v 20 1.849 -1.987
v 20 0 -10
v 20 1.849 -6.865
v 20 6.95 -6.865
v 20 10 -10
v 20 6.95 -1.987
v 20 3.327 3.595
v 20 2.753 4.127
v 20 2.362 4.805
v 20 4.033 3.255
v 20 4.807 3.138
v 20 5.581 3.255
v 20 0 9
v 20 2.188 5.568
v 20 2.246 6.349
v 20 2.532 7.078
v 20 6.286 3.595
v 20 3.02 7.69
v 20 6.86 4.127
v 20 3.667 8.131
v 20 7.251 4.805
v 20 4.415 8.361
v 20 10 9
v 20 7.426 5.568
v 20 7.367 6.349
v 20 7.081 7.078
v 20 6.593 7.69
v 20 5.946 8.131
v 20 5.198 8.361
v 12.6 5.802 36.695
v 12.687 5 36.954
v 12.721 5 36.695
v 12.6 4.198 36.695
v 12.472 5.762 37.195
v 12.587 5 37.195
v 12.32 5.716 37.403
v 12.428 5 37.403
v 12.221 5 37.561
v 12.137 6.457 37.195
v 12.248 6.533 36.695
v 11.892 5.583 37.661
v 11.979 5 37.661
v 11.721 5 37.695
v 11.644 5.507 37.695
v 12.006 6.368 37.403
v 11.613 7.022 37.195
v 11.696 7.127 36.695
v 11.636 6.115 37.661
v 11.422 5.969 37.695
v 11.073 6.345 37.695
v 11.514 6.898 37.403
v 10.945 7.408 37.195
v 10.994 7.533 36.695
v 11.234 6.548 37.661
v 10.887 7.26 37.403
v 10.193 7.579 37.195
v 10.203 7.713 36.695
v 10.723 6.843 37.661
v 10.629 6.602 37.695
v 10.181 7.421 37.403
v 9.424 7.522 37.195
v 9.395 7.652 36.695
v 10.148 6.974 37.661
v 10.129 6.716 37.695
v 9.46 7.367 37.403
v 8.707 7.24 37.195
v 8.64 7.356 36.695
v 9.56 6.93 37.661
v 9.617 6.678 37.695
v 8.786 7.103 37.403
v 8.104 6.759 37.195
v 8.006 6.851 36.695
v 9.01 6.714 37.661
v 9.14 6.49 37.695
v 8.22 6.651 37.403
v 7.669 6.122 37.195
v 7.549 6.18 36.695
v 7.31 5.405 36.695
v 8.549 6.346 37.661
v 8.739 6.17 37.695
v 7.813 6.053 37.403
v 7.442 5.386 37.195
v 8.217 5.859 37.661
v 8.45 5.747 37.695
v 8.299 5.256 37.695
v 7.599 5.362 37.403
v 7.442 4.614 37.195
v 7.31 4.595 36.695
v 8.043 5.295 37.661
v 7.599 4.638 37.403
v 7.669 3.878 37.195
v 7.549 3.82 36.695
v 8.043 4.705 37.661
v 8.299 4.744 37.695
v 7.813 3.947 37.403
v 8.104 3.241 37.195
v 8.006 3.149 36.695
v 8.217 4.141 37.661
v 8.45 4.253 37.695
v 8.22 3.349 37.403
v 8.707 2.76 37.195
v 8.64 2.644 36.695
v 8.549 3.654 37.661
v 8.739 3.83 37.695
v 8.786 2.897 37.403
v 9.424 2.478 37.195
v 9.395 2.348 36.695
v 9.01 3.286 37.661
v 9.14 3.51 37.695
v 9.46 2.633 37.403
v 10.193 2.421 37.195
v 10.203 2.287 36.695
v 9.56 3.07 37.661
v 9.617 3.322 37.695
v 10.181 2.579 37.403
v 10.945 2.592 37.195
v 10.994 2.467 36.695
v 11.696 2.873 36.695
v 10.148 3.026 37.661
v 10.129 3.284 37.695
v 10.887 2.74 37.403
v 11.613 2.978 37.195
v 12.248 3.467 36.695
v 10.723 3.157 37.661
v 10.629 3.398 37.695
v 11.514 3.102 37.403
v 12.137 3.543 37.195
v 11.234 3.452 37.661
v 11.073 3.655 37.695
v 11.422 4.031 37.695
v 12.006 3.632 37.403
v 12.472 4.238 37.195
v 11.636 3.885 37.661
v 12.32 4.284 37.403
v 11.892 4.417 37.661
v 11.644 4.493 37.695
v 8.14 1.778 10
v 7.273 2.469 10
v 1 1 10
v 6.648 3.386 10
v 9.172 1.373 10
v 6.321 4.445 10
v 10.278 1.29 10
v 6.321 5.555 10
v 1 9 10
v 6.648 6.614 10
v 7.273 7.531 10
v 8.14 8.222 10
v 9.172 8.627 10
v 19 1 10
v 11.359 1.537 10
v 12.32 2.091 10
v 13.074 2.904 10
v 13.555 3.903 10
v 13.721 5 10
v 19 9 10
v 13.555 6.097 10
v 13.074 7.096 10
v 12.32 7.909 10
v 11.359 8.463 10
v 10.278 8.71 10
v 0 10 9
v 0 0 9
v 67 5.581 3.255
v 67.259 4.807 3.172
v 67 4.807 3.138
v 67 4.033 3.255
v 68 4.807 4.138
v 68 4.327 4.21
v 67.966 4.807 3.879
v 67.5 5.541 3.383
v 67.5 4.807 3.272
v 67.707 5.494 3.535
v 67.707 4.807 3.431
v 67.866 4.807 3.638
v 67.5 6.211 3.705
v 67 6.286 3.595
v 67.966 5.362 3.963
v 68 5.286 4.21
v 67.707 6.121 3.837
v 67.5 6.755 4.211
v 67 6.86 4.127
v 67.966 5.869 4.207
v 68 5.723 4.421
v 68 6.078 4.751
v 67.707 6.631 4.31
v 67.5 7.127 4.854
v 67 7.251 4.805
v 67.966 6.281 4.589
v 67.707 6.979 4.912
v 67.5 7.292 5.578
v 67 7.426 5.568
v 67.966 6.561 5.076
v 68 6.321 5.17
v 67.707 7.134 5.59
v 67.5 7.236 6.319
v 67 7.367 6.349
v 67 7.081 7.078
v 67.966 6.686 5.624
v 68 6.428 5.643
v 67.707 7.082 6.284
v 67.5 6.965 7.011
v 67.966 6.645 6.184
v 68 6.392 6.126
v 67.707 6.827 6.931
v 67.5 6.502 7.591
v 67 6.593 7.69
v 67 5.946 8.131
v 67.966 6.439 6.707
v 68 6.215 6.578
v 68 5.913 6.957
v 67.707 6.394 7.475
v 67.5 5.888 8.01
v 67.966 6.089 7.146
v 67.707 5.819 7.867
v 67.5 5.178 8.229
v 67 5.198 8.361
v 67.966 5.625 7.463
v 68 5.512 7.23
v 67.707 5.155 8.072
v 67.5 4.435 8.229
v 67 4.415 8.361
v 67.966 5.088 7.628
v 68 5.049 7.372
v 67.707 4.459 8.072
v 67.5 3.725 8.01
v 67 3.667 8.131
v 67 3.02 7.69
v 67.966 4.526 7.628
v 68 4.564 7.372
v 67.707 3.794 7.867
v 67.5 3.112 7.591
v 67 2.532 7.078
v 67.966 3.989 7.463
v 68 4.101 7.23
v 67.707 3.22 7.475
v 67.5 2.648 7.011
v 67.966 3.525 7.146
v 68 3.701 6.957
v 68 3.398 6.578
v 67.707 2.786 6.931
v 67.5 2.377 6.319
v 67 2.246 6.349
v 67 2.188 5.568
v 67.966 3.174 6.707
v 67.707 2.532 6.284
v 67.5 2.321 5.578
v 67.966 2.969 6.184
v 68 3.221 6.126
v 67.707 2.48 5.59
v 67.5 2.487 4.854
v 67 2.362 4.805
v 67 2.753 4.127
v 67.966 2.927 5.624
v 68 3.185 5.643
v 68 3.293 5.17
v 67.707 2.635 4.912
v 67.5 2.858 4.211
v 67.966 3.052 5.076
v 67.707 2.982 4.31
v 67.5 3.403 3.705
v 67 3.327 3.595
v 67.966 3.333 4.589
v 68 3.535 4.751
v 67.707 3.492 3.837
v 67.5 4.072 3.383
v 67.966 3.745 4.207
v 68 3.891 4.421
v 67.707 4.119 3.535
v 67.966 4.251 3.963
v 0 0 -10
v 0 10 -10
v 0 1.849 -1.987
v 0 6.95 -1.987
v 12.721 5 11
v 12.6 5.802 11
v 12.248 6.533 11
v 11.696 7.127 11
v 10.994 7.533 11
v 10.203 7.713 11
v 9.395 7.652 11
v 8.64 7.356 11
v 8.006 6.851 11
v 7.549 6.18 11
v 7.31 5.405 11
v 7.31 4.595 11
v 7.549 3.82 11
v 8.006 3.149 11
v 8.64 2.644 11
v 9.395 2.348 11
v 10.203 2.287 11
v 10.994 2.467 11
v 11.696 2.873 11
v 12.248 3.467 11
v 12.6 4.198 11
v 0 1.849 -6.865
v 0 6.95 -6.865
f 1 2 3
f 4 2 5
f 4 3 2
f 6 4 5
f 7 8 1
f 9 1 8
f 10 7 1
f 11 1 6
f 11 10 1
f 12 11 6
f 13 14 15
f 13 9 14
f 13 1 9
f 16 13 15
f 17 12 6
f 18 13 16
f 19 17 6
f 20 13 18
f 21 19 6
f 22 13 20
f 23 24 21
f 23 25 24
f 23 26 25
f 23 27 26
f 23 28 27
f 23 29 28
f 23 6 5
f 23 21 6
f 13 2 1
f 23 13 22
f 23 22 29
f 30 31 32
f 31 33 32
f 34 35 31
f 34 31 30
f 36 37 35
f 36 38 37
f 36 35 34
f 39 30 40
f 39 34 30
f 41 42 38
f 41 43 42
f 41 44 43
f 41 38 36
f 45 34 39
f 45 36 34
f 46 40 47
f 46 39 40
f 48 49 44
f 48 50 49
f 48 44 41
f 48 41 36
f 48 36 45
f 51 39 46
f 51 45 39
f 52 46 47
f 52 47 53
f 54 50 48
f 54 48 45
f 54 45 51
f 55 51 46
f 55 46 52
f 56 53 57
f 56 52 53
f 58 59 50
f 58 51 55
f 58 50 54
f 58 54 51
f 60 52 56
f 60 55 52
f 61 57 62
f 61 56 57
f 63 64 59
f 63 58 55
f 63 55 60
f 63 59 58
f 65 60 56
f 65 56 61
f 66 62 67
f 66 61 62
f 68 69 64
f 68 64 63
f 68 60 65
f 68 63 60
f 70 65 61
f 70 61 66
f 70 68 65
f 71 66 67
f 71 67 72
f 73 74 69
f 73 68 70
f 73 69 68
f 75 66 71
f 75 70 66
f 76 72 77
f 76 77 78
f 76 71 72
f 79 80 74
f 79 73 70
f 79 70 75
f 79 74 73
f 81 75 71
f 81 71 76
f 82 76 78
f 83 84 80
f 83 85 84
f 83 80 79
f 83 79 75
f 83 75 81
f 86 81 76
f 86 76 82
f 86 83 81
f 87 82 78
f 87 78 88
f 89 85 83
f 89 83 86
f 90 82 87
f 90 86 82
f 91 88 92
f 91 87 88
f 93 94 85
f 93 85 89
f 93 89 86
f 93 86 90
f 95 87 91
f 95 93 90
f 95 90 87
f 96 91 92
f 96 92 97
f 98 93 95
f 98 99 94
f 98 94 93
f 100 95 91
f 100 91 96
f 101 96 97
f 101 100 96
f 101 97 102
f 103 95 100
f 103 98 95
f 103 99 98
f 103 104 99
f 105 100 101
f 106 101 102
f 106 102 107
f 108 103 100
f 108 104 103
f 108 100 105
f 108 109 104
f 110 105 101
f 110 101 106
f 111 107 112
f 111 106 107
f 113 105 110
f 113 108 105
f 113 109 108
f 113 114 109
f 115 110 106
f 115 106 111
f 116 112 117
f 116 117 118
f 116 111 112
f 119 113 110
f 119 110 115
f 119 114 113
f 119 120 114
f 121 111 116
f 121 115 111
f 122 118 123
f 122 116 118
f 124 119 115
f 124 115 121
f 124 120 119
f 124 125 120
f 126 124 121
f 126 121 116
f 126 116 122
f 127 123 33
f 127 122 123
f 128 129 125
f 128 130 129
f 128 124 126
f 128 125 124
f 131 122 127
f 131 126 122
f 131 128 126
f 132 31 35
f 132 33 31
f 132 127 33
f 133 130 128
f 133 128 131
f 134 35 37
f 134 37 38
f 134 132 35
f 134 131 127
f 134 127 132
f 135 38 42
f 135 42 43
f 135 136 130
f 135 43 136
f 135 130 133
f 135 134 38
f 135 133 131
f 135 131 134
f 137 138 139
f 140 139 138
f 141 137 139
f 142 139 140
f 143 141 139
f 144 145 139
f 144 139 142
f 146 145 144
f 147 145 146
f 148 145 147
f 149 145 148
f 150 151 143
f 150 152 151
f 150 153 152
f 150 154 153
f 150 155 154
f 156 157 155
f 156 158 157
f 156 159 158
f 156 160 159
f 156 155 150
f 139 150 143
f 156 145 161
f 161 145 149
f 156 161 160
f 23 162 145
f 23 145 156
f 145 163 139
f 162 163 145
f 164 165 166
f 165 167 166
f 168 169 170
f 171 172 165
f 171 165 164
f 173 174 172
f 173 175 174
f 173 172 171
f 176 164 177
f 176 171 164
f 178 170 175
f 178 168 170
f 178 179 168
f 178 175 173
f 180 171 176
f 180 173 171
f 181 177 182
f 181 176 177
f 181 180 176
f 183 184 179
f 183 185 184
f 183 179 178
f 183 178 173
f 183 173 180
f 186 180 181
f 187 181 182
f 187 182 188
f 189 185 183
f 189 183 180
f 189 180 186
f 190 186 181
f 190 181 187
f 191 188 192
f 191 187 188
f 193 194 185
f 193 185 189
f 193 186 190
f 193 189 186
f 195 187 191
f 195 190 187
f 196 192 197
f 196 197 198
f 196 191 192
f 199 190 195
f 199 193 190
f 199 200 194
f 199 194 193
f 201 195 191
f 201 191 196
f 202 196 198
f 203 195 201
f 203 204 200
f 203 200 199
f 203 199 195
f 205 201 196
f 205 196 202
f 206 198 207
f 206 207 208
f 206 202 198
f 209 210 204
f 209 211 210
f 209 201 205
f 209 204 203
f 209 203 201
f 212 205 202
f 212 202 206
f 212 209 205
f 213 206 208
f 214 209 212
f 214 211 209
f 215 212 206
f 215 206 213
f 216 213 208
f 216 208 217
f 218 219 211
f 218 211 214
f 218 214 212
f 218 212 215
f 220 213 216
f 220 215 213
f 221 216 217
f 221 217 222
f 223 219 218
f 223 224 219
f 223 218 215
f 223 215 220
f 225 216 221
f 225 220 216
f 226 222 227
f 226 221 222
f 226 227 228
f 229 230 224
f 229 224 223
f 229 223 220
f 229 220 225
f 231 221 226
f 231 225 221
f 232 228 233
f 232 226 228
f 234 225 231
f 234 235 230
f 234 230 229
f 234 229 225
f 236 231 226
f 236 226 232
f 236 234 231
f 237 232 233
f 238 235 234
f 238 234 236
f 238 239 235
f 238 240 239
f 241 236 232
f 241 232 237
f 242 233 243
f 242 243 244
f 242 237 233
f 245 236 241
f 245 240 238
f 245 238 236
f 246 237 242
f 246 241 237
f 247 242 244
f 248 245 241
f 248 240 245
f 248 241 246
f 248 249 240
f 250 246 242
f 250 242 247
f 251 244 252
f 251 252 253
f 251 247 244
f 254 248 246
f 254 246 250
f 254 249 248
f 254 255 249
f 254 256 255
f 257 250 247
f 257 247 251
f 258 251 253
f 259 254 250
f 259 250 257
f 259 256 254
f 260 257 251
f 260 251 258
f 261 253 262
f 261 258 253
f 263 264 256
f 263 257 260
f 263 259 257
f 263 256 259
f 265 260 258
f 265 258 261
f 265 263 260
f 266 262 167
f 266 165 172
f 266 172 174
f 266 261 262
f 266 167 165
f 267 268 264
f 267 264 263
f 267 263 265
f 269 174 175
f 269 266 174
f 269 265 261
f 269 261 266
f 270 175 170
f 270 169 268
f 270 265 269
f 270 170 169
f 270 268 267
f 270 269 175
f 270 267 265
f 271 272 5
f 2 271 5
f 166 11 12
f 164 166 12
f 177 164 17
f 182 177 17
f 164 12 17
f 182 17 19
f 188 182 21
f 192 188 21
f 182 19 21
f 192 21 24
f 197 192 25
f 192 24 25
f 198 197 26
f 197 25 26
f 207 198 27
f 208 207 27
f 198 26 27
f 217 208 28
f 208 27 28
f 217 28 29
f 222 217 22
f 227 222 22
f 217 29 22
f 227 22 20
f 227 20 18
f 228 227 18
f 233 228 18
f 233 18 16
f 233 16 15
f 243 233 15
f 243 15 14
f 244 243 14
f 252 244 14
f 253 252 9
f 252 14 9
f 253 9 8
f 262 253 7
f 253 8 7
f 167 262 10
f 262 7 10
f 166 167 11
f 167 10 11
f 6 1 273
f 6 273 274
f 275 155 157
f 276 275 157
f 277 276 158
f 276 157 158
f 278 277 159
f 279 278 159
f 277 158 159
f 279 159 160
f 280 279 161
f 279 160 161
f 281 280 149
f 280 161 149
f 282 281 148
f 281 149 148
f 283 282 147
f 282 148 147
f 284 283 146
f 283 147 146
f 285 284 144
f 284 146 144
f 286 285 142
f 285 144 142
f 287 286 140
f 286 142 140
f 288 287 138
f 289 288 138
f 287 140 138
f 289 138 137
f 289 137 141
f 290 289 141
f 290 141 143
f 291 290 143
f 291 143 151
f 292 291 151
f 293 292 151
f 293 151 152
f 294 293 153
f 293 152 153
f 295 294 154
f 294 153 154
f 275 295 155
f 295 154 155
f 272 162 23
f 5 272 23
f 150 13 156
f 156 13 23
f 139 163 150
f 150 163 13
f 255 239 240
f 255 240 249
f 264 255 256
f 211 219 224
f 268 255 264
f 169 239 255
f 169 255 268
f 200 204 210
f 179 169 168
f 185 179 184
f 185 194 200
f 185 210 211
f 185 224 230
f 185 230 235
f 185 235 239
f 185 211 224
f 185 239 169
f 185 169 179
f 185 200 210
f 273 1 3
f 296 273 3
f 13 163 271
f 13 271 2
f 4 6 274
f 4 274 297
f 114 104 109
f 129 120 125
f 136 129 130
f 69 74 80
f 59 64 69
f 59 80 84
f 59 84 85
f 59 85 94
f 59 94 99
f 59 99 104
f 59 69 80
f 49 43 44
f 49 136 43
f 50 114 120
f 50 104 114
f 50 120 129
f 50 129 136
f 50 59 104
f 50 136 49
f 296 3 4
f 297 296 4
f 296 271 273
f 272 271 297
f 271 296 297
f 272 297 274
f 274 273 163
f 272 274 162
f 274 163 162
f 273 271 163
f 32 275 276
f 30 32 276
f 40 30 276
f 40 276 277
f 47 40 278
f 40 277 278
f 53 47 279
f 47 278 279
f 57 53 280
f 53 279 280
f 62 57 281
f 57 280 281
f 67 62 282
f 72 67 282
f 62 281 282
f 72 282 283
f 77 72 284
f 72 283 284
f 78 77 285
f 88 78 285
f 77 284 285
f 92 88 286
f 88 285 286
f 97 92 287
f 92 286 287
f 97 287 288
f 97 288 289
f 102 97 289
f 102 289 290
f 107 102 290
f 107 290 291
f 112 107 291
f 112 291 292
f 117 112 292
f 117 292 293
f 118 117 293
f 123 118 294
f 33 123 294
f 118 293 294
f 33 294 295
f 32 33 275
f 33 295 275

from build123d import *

# Parameters (mm, degrees)
BOSS_EXTRUDE1_DEPTH      = 10
BOSS_EXTRUDE1_DEPTH_BACK = 10
SKETCH1_W                = 20
SKETCH1_H                = 10
SKETCH3_R                = 2.720672102
BOSS_EXTRUDE2_DEPTH      = 27.695455009
SKETCH6_R                = 2.626203493
BOSS_EXTRUDE3_DEPTH      = 48
SKETCH6_5_W              = 4.878057838
SKETCH6_5_H              = 5.100515908
CUT_EXTRUDE2_DEPTH       = 48
FILLET1_R                = 1
CHAMFER1_SIZE            = 1
FILLET5_R                = 1


with BuildPart() as part:
    # Sketch1 → Boss-Extrude1 (new, two sides: drawn at the far end of the back side and taken through both)
    with BuildSketch(Plane.XY.offset(-BOSS_EXTRUDE1_DEPTH_BACK)):
        with Locations((10, 5)):
            Rectangle(SKETCH1_W, SKETCH1_H)
    extrude(amount=BOSS_EXTRUDE1_DEPTH + BOSS_EXTRUDE1_DEPTH_BACK)

    # Sketch3 → Boss-Extrude2 (add)
    with BuildSketch(Plane.XY.offset(10)):
        with Locations((10, 5)):
            Circle(SKETCH3_R)
    extrude(amount=BOSS_EXTRUDE2_DEPTH)

    # Sketch6 → Boss-Extrude3 (add)
    with BuildSketch(Plane(origin=(20, 0, 0), x_dir=(0, 0, -1), z_dir=(1, 0, 0))):
        with Locations((-5.764422097, 4.80674108)):
            Circle(SKETCH6_R)
    extrude(amount=BOSS_EXTRUDE3_DEPTH)

    # Sketch6<5> → Cut-Extrude2 (cut)
    with BuildSketch(Plane(origin=(20, 0, 0), x_dir=(0, 0, -1), z_dir=(1, 0, 0))):
        with Locations((4.426041194, 4.399566895)):
            Rectangle(SKETCH6_5_W, SKETCH6_5_H)
    extrude(amount=-CUT_EXTRUDE2_DEPTH, mode=Mode.SUBTRACT)

    # Fillet1
    fillet1_edges = [part.edges().sort_by_distance(p)[0] for p in [
        (7.279327898, 5, 37.695455009),
    ]]
    fillet(fillet1_edges, radius=FILLET1_R)

    # Chamfer1
    chamfer1_edges = [part.edges().sort_by_distance(p)[0] for p in [
        (10, 10, 10),
        (20, 5, 10),
        (10, 0, 10),
        (0, 5, 10),
        (7.279327898, 5, 10),
    ]]
    chamfer(chamfer1_edges, length=CHAMFER1_SIZE)

    # Fillet5
    fillet5_edges = [part.edges().sort_by_distance(p)[0] for p in [
        (68, 4.80674108, 8.390625589),
    ]]
    fillet(fillet5_edges, radius=FILLET5_R)


solid = part.part
